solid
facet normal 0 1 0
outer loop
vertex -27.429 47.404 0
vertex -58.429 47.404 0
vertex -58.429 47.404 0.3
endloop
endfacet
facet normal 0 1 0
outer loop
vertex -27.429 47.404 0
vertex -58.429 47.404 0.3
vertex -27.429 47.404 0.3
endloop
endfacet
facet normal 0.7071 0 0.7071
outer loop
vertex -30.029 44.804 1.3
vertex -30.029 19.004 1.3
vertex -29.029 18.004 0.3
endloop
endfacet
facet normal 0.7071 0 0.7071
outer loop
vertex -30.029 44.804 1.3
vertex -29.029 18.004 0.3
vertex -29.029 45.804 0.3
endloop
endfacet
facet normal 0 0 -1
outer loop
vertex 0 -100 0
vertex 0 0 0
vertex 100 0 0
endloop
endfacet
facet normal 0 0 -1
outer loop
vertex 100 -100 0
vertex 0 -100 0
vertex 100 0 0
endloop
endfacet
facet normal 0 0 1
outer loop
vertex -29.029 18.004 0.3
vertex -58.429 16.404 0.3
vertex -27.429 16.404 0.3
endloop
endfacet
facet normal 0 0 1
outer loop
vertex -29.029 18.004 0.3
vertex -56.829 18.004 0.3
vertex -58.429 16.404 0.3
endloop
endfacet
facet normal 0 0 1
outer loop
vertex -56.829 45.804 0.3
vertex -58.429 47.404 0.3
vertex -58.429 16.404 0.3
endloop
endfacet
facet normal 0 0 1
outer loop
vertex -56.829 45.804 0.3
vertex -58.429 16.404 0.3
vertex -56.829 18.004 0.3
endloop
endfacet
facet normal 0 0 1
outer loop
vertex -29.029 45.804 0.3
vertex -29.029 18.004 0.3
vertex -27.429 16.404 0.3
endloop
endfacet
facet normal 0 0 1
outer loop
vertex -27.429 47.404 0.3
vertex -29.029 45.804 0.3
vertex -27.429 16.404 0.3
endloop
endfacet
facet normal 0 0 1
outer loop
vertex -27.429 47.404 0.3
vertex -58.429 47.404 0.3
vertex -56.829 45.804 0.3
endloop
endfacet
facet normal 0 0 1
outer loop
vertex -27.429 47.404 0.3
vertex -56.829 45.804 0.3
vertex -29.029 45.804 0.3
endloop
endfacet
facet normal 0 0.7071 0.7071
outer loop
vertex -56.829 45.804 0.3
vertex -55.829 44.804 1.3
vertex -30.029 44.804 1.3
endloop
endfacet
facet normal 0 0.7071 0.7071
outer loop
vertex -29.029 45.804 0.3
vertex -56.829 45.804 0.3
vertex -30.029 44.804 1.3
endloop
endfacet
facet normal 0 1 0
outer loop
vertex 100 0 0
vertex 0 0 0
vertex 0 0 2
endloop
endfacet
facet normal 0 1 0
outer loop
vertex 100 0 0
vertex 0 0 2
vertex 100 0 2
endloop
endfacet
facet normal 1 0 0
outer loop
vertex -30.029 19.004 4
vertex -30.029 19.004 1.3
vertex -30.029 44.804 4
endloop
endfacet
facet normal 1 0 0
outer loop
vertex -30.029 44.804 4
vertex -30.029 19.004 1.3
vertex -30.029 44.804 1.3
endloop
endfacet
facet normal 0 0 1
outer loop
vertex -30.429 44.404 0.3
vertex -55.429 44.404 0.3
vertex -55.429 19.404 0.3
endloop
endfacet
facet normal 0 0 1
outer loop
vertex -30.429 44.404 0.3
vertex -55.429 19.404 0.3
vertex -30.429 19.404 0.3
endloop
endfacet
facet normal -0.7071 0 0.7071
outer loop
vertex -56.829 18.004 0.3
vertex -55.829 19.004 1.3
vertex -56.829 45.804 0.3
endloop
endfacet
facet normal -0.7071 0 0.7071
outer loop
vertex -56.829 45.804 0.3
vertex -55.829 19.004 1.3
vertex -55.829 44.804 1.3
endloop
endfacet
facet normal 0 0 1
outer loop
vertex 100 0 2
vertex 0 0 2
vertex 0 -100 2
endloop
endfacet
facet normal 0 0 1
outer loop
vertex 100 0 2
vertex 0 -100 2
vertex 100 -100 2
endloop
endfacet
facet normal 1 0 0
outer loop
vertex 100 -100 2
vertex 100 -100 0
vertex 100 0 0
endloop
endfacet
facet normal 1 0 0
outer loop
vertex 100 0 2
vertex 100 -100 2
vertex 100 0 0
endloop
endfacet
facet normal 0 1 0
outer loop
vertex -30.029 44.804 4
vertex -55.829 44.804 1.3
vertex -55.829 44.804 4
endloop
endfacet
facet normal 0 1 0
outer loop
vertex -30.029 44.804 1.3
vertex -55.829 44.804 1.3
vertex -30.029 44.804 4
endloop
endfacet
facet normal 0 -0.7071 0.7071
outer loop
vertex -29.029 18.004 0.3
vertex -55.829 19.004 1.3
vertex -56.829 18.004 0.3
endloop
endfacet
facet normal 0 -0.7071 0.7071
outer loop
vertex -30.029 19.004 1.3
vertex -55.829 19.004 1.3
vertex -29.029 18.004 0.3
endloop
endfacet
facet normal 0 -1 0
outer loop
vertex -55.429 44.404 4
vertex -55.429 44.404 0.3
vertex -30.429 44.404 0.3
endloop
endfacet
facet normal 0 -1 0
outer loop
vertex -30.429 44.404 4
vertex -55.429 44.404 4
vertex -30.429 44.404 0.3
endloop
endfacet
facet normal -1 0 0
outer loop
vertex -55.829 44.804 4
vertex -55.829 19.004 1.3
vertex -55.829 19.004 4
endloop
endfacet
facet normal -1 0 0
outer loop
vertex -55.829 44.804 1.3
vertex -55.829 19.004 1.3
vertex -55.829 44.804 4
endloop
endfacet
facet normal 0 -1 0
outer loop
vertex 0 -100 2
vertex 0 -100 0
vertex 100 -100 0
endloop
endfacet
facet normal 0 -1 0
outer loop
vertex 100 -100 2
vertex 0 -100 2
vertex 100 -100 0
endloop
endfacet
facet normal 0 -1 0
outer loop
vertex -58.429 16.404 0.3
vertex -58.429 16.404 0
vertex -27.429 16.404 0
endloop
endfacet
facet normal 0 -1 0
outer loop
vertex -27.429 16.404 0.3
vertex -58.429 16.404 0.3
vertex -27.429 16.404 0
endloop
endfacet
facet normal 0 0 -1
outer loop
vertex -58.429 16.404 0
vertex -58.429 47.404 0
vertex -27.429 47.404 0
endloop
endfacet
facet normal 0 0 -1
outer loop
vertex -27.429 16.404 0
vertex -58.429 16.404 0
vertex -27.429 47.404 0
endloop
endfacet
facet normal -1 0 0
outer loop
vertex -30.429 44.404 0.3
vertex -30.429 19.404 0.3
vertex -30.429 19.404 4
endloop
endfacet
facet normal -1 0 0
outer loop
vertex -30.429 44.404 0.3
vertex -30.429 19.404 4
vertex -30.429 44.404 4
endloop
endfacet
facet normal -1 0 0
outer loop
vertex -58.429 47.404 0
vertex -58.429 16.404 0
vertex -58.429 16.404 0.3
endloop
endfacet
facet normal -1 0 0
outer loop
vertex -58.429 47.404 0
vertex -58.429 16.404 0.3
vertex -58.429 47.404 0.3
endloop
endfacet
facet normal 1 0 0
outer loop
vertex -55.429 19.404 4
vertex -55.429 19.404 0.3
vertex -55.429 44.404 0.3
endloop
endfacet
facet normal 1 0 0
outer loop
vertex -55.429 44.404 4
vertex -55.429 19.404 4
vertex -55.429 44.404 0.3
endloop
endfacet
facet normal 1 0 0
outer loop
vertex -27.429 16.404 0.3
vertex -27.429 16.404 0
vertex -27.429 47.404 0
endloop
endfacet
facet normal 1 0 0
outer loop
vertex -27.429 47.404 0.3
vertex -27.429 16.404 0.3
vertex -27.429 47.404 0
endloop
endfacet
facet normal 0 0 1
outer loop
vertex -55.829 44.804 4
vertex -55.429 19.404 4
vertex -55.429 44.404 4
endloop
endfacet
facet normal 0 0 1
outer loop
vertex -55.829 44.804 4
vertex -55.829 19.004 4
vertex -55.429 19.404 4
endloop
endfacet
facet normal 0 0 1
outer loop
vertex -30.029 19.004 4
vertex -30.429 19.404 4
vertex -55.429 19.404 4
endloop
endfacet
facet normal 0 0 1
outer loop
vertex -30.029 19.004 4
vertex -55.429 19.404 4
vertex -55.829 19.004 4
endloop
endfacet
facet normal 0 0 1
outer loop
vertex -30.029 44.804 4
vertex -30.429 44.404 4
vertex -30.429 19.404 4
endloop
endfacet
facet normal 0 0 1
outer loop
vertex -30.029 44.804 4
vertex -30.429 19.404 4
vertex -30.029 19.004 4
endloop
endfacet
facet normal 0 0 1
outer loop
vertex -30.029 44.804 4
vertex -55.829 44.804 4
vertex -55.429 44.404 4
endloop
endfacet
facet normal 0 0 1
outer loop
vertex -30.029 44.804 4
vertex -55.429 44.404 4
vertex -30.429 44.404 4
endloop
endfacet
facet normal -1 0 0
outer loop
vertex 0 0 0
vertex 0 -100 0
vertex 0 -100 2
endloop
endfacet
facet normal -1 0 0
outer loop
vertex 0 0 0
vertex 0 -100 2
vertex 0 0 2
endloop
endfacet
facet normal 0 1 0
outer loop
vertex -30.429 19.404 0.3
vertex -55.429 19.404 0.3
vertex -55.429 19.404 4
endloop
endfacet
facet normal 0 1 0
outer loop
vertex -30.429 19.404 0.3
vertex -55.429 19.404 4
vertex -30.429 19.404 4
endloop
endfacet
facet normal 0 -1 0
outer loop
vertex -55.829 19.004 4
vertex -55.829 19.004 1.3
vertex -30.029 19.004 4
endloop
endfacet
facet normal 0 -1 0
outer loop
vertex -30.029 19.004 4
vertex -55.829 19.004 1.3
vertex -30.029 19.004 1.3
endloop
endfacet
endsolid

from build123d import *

# Parameters (mm, degrees)
F0_W     = 100
F0_H     = 100
F1_DEPTH = 2
F2_W     = 25.8
F2_H     = 25.8
F2_W_2   = 25
F2_H_2   = 25
F3_DEPTH = 4
F2_W_3   = 31
F2_H_3   = 31
F4_DEPTH = 0.3
F5_SIZE  = 1


with BuildPart() as f1:
    # F0 (on Top) → F1 (new body)
    with BuildSketch(Plane.XY):
        with Locations((50, -50)):
            Rectangle(F0_W, F0_H)
    extrude(amount=F1_DEPTH)


with BuildPart() as f3:
    # F2 (on Top) → F3 (new body)
    with BuildSketch(Plane.XY):
        with Locations((-42.9286845028, 31.9038328333)):
            Rectangle(F2_W, F2_H)
        with Locations((-42.9286845028, 31.9038328333)):
            Rectangle(F2_W_2, F2_H_2, mode=Mode.SUBTRACT)
    extrude(amount=F3_DEPTH)

    # F2 (on Top) → F4 (join)
    with BuildSketch(Plane.XY):
        with Locations((-42.9286845028, 31.9038328333)):
            Rectangle(F2_W_3, F2_H_3)
        with Locations((-42.9286845028, 31.9038328333)):
            Rectangle(F2_W, F2_H, mode=Mode.SUBTRACT)
        with Locations((-42.9286845028, 31.9038328333)):
            Rectangle(F2_W, F2_H)
        with Locations((-42.9286845028, 31.9038328333)):
            Rectangle(F2_W_2, F2_H_2, mode=Mode.SUBTRACT)
        with Locations((-42.9286845028, 31.9038328333)):
            Rectangle(F2_W_2, F2_H_2)
    extrude(amount=F4_DEPTH)

    # F5
    f5_edges = [f3.edges().sort_by_distance(p)[0] for p in [
        (-42.928685, 44.803833, 0.3),
        (-30.028685, 31.903833, 0.3),
        (-55.828685, 31.903833, 0.3),
        (-42.928685, 19.003833, 0.3),
    ]]
    chamfer(f5_edges, length=F5_SIZE)


solid = Compound([f1.part, f3.part])
